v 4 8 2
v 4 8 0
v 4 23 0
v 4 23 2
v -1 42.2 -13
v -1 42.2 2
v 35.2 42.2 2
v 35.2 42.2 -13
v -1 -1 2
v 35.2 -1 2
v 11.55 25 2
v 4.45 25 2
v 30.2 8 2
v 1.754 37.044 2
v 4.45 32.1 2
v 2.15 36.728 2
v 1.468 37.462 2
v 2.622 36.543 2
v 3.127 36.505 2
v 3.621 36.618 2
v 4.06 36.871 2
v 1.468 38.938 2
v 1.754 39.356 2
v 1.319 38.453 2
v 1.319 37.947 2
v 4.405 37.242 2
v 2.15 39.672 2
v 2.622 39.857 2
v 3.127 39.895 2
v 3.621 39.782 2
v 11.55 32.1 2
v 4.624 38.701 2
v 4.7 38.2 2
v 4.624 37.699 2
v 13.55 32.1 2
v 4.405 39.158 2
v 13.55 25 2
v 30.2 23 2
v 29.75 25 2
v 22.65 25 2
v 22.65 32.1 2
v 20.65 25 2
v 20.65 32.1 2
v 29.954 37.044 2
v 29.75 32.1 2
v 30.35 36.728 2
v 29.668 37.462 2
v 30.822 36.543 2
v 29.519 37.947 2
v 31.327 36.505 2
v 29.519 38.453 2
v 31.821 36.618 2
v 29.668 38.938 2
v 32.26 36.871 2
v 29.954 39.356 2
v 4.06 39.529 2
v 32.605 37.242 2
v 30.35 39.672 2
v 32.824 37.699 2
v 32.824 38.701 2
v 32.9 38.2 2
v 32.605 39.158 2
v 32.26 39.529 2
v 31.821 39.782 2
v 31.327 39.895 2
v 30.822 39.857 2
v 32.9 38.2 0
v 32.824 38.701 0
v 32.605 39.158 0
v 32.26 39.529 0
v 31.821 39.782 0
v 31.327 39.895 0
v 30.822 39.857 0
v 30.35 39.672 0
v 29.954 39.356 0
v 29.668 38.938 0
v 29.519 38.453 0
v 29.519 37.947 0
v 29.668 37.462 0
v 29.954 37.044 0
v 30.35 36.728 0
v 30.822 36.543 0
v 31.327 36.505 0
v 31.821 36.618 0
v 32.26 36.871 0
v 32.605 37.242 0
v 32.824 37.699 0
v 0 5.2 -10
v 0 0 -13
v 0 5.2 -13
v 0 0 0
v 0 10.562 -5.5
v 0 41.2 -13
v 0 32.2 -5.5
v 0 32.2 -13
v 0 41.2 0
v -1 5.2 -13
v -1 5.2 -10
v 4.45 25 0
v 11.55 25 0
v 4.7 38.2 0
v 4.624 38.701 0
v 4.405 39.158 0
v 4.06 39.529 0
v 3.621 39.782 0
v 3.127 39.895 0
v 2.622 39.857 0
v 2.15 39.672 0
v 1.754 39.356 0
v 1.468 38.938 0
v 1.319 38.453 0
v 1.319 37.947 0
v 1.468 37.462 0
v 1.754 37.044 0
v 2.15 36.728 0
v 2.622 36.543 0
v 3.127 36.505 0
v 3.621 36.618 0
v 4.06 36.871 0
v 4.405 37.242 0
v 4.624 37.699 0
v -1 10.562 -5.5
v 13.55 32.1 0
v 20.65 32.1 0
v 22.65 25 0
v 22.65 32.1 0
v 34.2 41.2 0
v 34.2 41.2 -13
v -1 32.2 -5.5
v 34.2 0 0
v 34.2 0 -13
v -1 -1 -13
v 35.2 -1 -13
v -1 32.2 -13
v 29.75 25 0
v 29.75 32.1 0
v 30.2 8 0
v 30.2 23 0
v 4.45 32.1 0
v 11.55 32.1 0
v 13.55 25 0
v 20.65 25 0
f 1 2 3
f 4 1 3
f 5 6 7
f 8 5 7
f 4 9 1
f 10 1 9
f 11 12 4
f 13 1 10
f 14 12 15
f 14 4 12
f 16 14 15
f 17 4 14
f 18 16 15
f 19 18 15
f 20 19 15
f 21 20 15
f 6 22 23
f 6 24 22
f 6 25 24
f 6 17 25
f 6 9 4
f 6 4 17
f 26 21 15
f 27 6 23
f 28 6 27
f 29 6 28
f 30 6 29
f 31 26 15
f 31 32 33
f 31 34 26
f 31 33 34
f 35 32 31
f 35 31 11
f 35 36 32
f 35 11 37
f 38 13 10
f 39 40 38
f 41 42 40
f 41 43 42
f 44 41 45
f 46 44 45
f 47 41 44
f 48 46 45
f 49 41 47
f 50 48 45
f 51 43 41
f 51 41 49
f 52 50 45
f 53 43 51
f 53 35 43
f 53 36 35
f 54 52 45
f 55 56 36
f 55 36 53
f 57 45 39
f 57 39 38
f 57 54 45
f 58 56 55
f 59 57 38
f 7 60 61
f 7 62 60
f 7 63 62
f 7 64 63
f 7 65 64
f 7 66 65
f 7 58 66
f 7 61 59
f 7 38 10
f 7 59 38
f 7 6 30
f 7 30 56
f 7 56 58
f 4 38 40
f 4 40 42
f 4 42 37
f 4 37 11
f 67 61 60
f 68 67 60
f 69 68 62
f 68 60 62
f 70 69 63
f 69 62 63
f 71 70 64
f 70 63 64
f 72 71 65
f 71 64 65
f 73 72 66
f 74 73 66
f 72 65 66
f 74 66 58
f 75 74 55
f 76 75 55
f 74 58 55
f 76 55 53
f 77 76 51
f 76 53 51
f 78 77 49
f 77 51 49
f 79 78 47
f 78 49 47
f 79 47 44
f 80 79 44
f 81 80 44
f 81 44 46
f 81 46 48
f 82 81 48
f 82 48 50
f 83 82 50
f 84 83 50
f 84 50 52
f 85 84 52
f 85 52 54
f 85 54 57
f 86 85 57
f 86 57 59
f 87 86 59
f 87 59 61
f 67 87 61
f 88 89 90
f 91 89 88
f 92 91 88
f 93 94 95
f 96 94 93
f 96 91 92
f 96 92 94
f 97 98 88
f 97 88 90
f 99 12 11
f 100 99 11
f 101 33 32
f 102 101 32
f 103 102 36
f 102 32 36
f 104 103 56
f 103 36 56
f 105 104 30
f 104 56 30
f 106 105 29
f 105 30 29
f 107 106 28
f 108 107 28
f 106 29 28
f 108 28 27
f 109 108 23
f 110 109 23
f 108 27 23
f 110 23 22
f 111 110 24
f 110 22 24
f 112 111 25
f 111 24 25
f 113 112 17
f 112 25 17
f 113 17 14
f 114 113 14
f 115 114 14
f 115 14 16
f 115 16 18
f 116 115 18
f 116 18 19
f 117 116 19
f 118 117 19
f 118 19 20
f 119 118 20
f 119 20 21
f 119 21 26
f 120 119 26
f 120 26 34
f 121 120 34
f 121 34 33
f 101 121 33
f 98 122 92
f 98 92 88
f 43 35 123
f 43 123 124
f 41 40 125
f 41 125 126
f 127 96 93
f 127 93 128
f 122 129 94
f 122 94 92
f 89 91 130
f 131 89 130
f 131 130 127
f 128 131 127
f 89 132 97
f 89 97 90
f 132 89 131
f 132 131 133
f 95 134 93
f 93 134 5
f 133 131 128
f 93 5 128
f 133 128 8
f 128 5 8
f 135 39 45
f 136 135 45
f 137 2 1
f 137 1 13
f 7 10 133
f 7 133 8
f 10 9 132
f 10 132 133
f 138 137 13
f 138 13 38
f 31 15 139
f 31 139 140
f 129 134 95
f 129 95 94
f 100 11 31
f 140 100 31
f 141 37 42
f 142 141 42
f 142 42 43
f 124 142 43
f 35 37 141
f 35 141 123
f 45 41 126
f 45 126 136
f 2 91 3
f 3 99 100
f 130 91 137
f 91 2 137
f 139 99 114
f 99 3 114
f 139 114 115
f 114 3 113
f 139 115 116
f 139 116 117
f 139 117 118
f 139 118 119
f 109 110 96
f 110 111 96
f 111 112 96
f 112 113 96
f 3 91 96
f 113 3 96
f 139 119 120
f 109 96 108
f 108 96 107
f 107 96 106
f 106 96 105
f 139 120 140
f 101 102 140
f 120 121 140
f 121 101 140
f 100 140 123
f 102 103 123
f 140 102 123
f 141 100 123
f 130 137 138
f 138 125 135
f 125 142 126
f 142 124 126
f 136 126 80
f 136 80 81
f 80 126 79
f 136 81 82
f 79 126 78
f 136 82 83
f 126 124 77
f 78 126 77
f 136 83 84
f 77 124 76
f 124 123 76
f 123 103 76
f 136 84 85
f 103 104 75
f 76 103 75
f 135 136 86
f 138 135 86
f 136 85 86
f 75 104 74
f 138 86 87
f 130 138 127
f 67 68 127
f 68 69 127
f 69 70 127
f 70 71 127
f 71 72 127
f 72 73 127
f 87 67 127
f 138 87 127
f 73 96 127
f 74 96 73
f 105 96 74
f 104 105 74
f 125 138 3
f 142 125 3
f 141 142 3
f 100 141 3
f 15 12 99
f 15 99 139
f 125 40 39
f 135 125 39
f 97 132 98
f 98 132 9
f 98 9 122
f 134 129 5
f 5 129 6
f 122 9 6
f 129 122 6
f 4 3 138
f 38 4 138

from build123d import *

# Parameters (mm, degrees)
SKETCH_W        = 34.2
SKETCH_H        = 41.2
SKETCH_W_2      = 26.2
SKETCH_H_2      = 15
PAD_DEPTH       = 2
SKETCH001_R     = 1.7
POCKET_DEPTH    = 5
SKETCH002_W     = 7.1
SKETCH002_H     = 7.1
POCKET001_DEPTH = 5
SKETCH005_W     = 36.2
SKETCH005_H     = 43.2
SKETCH005_W_2   = 34.2
SKETCH005_H_2   = 41.2
PAD002_DEPTH    = 15
POCKET002_DEPTH = 5


with BuildPart() as part:
    # Sketch → Pad (new body)
    with BuildSketch(Plane.XY):
        with Locations((17.1, 20.6)):
            Rectangle(SKETCH_W, SKETCH_H)
        with Locations((17.1, 15.5)):
            Rectangle(SKETCH_W_2, SKETCH_H_2, mode=Mode.SUBTRACT)
    extrude(amount=PAD_DEPTH)

    # Sketch001 → Pocket (cut)
    with BuildSketch(Plane.XY.offset(2)):
        with Locations((3, 38.2)):
            Circle(SKETCH001_R)
        with Locations((31.2, 38.2)):
            Circle(SKETCH001_R)
    extrude(amount=-POCKET_DEPTH, mode=Mode.SUBTRACT)

    # Sketch002 → Pocket001 (cut)
    with BuildSketch(Plane.XY.offset(2)):
        with Locations((8, 28.55)):
            Rectangle(SKETCH002_W, SKETCH002_H)
        with Locations((17.1, 28.55)):
            Rectangle(SKETCH002_W, SKETCH002_H)
        with Locations((26.2, 28.55)):
            Rectangle(SKETCH002_W, SKETCH002_H)
    extrude(amount=-POCKET001_DEPTH, mode=Mode.SUBTRACT)

    # Sketch005 → Pad002 (new body)
    with BuildSketch(Plane.XY.offset(2)):
        with Locations((17.1, 20.6)):
            Rectangle(SKETCH005_W, SKETCH005_H)
        with Locations((17.1, 20.6)):
            Rectangle(SKETCH005_W_2, SKETCH005_H_2, mode=Mode.SUBTRACT)
    extrude(amount=-PAD002_DEPTH)

    # Sketch006 → Pocket002 (cut)
    with BuildSketch(Plane(origin=(-1, 0, 0), x_dir=(0, -1, 0), z_dir=(-1, 0, 0))):
        Polygon((-5.2, -13), (-32.2, -13), (-32.2, -5.500487), (-10.562311, -5.500487), (-5.2, -10), align=None)
    extrude(amount=-POCKET002_DEPTH, mode=Mode.SUBTRACT)


solid = part.part
